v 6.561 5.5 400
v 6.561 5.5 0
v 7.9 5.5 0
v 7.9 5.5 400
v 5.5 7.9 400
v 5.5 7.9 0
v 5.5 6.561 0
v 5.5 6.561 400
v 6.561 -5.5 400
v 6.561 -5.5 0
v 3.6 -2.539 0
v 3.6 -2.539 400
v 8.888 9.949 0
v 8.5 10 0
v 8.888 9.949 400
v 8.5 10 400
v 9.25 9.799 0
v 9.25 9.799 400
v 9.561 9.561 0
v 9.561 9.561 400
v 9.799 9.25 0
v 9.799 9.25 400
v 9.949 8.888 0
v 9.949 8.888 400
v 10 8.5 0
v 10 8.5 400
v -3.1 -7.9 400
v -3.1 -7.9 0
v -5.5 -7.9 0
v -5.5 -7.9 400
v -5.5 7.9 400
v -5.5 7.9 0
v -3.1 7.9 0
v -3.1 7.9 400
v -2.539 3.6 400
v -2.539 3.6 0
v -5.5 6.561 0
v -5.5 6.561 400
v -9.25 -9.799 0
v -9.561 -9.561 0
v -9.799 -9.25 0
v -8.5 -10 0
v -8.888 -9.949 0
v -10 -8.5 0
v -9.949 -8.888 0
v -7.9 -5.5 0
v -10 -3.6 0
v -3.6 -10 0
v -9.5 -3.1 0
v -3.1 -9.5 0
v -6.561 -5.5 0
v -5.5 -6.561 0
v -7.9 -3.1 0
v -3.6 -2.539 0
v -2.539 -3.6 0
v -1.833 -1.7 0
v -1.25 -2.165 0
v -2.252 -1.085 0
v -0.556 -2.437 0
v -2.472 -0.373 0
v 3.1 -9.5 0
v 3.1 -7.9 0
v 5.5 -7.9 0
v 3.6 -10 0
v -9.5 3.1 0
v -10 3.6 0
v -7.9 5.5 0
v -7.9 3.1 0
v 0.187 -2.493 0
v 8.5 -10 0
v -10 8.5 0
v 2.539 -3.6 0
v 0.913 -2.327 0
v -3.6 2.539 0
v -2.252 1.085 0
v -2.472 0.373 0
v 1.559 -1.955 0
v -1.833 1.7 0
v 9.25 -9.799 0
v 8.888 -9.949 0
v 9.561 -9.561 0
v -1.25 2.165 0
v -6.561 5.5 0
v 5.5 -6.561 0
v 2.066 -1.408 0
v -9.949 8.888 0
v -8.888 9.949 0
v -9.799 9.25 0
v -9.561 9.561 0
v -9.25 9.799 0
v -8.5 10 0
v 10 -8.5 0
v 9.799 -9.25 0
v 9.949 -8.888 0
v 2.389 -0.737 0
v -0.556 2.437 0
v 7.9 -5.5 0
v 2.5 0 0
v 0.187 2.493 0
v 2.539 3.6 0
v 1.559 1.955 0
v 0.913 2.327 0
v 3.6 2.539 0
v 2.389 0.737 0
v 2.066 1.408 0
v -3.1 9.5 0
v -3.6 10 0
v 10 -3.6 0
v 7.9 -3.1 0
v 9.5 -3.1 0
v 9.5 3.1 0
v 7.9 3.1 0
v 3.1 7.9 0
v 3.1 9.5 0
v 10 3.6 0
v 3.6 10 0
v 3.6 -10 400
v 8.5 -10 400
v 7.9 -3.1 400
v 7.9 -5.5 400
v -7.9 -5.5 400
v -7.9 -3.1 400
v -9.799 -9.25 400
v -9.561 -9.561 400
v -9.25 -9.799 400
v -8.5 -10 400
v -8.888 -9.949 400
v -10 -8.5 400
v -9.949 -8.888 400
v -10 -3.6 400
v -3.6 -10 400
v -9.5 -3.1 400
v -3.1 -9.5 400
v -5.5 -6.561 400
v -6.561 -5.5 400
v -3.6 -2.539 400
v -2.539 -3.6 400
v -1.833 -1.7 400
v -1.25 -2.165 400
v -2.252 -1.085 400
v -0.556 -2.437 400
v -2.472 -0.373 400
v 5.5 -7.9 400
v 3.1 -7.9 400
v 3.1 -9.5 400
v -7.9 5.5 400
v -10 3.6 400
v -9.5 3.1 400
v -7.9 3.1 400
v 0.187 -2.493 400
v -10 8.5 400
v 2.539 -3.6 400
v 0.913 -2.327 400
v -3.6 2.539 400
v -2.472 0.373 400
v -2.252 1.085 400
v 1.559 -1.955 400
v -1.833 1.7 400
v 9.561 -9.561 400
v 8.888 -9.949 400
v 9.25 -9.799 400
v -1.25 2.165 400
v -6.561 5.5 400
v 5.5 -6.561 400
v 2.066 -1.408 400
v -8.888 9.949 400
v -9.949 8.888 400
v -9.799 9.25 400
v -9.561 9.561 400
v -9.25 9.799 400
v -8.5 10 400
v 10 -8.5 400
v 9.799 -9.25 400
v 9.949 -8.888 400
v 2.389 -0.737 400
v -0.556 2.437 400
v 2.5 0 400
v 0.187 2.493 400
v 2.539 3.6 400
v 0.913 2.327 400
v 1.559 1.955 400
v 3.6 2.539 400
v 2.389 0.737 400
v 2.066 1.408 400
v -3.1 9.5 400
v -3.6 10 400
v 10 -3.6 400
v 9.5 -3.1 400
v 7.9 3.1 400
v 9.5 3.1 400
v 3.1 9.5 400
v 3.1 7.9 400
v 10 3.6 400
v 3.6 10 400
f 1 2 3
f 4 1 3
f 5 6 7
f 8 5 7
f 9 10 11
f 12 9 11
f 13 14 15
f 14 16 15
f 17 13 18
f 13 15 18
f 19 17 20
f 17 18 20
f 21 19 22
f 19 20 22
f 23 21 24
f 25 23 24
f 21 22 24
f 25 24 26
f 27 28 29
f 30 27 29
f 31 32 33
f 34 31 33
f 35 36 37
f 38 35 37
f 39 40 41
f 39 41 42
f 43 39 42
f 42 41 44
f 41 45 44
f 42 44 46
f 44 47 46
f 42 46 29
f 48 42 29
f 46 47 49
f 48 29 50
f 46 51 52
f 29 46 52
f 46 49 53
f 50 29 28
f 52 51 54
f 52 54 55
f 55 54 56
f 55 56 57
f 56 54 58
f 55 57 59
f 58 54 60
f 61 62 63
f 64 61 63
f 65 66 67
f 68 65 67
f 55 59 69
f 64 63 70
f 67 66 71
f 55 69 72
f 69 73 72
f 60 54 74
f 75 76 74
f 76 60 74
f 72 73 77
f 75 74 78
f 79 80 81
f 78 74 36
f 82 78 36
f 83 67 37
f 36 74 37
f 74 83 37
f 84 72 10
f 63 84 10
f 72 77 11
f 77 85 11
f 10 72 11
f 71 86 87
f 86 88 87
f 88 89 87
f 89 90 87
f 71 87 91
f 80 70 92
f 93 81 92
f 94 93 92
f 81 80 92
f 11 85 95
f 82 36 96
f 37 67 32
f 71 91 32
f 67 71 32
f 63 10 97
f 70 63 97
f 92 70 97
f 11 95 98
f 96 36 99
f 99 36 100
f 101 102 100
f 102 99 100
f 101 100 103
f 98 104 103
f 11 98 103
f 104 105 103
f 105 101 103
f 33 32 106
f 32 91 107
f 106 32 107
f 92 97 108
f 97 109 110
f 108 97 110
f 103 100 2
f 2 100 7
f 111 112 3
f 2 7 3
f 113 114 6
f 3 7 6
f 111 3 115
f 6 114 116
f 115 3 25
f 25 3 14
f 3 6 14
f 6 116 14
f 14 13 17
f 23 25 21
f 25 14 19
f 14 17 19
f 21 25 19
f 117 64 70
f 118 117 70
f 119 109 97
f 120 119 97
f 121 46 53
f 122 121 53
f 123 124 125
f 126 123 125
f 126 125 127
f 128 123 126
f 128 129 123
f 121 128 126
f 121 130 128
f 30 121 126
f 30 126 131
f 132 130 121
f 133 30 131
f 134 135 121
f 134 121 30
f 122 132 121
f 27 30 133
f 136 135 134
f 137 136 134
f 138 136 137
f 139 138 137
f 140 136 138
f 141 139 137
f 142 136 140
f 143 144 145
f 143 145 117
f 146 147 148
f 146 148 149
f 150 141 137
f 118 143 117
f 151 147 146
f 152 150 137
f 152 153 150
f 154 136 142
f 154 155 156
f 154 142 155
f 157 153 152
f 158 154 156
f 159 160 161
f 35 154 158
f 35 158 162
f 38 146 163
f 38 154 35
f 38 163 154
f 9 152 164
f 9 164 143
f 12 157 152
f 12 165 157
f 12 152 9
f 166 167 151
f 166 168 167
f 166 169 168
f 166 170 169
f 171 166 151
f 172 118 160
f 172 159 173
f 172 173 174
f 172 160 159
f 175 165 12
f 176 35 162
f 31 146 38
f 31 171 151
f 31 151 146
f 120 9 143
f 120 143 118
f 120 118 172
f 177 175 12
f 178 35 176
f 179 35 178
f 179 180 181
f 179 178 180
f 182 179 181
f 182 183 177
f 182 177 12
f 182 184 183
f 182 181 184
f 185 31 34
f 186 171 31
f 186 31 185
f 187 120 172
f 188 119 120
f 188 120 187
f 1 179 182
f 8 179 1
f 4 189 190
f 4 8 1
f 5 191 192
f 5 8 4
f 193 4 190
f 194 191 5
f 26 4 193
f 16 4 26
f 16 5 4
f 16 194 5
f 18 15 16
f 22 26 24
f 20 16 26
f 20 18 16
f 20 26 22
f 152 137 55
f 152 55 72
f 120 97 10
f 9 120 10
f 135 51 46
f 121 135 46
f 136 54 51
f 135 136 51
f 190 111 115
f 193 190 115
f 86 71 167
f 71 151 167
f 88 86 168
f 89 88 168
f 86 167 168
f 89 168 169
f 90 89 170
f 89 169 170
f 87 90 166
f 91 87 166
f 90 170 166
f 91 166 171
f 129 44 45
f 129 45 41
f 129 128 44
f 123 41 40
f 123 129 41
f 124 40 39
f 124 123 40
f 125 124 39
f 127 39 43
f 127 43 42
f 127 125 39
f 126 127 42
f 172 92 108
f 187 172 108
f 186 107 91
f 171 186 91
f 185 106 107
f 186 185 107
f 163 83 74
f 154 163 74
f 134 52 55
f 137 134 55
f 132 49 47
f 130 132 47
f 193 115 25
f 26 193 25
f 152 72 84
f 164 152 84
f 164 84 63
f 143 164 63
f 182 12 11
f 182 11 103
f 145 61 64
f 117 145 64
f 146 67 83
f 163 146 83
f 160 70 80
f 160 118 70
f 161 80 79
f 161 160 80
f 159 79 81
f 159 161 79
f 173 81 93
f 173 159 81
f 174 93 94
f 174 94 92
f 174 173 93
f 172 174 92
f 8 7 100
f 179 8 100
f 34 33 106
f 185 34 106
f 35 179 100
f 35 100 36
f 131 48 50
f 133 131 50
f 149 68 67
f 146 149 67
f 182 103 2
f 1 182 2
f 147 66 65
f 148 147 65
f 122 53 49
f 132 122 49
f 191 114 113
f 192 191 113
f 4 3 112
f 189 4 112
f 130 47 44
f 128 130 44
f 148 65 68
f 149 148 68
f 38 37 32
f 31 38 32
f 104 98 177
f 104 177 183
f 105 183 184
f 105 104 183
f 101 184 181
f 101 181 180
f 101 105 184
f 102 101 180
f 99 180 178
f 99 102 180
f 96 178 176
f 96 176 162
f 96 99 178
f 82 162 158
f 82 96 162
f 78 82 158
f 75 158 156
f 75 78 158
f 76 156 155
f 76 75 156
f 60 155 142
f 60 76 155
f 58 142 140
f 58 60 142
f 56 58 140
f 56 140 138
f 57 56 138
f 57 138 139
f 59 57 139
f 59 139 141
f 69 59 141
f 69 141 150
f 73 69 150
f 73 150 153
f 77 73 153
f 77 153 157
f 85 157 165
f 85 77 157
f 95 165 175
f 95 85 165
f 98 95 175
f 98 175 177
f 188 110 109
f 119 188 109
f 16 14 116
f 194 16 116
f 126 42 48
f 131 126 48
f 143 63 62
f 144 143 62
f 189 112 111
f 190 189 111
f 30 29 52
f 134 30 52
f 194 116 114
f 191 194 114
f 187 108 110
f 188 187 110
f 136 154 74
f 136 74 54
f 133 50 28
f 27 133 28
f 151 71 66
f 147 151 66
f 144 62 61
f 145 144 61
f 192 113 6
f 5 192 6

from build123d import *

# Parameters (mm, degrees)
SKETCH_R  = 2.5
PAD_DEPTH = 400
FILLET_R  = 1.5


with BuildPart() as part:
    # Sketch → Pad (new body)
    with BuildSketch(Plane.XY):
        Polygon((-3.6, 2.53934), (-3.6, -2.53934), (-6.56066, -5.5), (-7.9, -5.5), (-7.9, -3.1), (-9.5, -3.1), (-10, -3.6), (-10, -10), (-3.6, -10), (-3.1, -9.5), (-3.1, -7.9), (-5.5, -7.9), (-5.5, -6.56066), (-2.53934, -3.6), (2.53934, -3.6), (5.5, -6.56066), (5.5, -7.9), (3.1, -7.9), (3.1, -9.5), (3.6, -10), (10, -10), (10, -3.6), (9.5, -3.1), (7.9, -3.1), (7.9, -5.5), (6.56066, -5.5), (3.6, -2.53934), (3.6, 2.53934), (6.56066, 5.5), (7.899992, 5.5), (7.899998, 3.1), (9.5, 3.1), (10, 3.6), (10, 10), (3.6, 10), (3.1, 9.5), (3.1, 7.9), (5.5, 7.9), (5.5, 6.56066), (2.53934, 3.6), (-2.53934, 3.6), (-5.5, 6.56066), (-5.5, 7.9), (-3.1, 7.9), (-3.1, 9.5), (-3.6, 10), (-10, 10), (-10, 3.6), (-9.5, 3.1), (-7.9, 3.1), (-7.9, 5.5), (-6.56066, 5.5), align=None)
        Circle(SKETCH_R, mode=Mode.SUBTRACT)
    extrude(amount=PAD_DEPTH)

    # Fillet
    fillet_edges = [part.edges().sort_by_distance(p)[0] for p in [
        (-10, -10, 200),
        (10, -10, 200),
        (10, 10, 200),
        (-10, 10, 200),
    ]]
    fillet(fillet_edges, radius=FILLET_R)


solid = part.part
